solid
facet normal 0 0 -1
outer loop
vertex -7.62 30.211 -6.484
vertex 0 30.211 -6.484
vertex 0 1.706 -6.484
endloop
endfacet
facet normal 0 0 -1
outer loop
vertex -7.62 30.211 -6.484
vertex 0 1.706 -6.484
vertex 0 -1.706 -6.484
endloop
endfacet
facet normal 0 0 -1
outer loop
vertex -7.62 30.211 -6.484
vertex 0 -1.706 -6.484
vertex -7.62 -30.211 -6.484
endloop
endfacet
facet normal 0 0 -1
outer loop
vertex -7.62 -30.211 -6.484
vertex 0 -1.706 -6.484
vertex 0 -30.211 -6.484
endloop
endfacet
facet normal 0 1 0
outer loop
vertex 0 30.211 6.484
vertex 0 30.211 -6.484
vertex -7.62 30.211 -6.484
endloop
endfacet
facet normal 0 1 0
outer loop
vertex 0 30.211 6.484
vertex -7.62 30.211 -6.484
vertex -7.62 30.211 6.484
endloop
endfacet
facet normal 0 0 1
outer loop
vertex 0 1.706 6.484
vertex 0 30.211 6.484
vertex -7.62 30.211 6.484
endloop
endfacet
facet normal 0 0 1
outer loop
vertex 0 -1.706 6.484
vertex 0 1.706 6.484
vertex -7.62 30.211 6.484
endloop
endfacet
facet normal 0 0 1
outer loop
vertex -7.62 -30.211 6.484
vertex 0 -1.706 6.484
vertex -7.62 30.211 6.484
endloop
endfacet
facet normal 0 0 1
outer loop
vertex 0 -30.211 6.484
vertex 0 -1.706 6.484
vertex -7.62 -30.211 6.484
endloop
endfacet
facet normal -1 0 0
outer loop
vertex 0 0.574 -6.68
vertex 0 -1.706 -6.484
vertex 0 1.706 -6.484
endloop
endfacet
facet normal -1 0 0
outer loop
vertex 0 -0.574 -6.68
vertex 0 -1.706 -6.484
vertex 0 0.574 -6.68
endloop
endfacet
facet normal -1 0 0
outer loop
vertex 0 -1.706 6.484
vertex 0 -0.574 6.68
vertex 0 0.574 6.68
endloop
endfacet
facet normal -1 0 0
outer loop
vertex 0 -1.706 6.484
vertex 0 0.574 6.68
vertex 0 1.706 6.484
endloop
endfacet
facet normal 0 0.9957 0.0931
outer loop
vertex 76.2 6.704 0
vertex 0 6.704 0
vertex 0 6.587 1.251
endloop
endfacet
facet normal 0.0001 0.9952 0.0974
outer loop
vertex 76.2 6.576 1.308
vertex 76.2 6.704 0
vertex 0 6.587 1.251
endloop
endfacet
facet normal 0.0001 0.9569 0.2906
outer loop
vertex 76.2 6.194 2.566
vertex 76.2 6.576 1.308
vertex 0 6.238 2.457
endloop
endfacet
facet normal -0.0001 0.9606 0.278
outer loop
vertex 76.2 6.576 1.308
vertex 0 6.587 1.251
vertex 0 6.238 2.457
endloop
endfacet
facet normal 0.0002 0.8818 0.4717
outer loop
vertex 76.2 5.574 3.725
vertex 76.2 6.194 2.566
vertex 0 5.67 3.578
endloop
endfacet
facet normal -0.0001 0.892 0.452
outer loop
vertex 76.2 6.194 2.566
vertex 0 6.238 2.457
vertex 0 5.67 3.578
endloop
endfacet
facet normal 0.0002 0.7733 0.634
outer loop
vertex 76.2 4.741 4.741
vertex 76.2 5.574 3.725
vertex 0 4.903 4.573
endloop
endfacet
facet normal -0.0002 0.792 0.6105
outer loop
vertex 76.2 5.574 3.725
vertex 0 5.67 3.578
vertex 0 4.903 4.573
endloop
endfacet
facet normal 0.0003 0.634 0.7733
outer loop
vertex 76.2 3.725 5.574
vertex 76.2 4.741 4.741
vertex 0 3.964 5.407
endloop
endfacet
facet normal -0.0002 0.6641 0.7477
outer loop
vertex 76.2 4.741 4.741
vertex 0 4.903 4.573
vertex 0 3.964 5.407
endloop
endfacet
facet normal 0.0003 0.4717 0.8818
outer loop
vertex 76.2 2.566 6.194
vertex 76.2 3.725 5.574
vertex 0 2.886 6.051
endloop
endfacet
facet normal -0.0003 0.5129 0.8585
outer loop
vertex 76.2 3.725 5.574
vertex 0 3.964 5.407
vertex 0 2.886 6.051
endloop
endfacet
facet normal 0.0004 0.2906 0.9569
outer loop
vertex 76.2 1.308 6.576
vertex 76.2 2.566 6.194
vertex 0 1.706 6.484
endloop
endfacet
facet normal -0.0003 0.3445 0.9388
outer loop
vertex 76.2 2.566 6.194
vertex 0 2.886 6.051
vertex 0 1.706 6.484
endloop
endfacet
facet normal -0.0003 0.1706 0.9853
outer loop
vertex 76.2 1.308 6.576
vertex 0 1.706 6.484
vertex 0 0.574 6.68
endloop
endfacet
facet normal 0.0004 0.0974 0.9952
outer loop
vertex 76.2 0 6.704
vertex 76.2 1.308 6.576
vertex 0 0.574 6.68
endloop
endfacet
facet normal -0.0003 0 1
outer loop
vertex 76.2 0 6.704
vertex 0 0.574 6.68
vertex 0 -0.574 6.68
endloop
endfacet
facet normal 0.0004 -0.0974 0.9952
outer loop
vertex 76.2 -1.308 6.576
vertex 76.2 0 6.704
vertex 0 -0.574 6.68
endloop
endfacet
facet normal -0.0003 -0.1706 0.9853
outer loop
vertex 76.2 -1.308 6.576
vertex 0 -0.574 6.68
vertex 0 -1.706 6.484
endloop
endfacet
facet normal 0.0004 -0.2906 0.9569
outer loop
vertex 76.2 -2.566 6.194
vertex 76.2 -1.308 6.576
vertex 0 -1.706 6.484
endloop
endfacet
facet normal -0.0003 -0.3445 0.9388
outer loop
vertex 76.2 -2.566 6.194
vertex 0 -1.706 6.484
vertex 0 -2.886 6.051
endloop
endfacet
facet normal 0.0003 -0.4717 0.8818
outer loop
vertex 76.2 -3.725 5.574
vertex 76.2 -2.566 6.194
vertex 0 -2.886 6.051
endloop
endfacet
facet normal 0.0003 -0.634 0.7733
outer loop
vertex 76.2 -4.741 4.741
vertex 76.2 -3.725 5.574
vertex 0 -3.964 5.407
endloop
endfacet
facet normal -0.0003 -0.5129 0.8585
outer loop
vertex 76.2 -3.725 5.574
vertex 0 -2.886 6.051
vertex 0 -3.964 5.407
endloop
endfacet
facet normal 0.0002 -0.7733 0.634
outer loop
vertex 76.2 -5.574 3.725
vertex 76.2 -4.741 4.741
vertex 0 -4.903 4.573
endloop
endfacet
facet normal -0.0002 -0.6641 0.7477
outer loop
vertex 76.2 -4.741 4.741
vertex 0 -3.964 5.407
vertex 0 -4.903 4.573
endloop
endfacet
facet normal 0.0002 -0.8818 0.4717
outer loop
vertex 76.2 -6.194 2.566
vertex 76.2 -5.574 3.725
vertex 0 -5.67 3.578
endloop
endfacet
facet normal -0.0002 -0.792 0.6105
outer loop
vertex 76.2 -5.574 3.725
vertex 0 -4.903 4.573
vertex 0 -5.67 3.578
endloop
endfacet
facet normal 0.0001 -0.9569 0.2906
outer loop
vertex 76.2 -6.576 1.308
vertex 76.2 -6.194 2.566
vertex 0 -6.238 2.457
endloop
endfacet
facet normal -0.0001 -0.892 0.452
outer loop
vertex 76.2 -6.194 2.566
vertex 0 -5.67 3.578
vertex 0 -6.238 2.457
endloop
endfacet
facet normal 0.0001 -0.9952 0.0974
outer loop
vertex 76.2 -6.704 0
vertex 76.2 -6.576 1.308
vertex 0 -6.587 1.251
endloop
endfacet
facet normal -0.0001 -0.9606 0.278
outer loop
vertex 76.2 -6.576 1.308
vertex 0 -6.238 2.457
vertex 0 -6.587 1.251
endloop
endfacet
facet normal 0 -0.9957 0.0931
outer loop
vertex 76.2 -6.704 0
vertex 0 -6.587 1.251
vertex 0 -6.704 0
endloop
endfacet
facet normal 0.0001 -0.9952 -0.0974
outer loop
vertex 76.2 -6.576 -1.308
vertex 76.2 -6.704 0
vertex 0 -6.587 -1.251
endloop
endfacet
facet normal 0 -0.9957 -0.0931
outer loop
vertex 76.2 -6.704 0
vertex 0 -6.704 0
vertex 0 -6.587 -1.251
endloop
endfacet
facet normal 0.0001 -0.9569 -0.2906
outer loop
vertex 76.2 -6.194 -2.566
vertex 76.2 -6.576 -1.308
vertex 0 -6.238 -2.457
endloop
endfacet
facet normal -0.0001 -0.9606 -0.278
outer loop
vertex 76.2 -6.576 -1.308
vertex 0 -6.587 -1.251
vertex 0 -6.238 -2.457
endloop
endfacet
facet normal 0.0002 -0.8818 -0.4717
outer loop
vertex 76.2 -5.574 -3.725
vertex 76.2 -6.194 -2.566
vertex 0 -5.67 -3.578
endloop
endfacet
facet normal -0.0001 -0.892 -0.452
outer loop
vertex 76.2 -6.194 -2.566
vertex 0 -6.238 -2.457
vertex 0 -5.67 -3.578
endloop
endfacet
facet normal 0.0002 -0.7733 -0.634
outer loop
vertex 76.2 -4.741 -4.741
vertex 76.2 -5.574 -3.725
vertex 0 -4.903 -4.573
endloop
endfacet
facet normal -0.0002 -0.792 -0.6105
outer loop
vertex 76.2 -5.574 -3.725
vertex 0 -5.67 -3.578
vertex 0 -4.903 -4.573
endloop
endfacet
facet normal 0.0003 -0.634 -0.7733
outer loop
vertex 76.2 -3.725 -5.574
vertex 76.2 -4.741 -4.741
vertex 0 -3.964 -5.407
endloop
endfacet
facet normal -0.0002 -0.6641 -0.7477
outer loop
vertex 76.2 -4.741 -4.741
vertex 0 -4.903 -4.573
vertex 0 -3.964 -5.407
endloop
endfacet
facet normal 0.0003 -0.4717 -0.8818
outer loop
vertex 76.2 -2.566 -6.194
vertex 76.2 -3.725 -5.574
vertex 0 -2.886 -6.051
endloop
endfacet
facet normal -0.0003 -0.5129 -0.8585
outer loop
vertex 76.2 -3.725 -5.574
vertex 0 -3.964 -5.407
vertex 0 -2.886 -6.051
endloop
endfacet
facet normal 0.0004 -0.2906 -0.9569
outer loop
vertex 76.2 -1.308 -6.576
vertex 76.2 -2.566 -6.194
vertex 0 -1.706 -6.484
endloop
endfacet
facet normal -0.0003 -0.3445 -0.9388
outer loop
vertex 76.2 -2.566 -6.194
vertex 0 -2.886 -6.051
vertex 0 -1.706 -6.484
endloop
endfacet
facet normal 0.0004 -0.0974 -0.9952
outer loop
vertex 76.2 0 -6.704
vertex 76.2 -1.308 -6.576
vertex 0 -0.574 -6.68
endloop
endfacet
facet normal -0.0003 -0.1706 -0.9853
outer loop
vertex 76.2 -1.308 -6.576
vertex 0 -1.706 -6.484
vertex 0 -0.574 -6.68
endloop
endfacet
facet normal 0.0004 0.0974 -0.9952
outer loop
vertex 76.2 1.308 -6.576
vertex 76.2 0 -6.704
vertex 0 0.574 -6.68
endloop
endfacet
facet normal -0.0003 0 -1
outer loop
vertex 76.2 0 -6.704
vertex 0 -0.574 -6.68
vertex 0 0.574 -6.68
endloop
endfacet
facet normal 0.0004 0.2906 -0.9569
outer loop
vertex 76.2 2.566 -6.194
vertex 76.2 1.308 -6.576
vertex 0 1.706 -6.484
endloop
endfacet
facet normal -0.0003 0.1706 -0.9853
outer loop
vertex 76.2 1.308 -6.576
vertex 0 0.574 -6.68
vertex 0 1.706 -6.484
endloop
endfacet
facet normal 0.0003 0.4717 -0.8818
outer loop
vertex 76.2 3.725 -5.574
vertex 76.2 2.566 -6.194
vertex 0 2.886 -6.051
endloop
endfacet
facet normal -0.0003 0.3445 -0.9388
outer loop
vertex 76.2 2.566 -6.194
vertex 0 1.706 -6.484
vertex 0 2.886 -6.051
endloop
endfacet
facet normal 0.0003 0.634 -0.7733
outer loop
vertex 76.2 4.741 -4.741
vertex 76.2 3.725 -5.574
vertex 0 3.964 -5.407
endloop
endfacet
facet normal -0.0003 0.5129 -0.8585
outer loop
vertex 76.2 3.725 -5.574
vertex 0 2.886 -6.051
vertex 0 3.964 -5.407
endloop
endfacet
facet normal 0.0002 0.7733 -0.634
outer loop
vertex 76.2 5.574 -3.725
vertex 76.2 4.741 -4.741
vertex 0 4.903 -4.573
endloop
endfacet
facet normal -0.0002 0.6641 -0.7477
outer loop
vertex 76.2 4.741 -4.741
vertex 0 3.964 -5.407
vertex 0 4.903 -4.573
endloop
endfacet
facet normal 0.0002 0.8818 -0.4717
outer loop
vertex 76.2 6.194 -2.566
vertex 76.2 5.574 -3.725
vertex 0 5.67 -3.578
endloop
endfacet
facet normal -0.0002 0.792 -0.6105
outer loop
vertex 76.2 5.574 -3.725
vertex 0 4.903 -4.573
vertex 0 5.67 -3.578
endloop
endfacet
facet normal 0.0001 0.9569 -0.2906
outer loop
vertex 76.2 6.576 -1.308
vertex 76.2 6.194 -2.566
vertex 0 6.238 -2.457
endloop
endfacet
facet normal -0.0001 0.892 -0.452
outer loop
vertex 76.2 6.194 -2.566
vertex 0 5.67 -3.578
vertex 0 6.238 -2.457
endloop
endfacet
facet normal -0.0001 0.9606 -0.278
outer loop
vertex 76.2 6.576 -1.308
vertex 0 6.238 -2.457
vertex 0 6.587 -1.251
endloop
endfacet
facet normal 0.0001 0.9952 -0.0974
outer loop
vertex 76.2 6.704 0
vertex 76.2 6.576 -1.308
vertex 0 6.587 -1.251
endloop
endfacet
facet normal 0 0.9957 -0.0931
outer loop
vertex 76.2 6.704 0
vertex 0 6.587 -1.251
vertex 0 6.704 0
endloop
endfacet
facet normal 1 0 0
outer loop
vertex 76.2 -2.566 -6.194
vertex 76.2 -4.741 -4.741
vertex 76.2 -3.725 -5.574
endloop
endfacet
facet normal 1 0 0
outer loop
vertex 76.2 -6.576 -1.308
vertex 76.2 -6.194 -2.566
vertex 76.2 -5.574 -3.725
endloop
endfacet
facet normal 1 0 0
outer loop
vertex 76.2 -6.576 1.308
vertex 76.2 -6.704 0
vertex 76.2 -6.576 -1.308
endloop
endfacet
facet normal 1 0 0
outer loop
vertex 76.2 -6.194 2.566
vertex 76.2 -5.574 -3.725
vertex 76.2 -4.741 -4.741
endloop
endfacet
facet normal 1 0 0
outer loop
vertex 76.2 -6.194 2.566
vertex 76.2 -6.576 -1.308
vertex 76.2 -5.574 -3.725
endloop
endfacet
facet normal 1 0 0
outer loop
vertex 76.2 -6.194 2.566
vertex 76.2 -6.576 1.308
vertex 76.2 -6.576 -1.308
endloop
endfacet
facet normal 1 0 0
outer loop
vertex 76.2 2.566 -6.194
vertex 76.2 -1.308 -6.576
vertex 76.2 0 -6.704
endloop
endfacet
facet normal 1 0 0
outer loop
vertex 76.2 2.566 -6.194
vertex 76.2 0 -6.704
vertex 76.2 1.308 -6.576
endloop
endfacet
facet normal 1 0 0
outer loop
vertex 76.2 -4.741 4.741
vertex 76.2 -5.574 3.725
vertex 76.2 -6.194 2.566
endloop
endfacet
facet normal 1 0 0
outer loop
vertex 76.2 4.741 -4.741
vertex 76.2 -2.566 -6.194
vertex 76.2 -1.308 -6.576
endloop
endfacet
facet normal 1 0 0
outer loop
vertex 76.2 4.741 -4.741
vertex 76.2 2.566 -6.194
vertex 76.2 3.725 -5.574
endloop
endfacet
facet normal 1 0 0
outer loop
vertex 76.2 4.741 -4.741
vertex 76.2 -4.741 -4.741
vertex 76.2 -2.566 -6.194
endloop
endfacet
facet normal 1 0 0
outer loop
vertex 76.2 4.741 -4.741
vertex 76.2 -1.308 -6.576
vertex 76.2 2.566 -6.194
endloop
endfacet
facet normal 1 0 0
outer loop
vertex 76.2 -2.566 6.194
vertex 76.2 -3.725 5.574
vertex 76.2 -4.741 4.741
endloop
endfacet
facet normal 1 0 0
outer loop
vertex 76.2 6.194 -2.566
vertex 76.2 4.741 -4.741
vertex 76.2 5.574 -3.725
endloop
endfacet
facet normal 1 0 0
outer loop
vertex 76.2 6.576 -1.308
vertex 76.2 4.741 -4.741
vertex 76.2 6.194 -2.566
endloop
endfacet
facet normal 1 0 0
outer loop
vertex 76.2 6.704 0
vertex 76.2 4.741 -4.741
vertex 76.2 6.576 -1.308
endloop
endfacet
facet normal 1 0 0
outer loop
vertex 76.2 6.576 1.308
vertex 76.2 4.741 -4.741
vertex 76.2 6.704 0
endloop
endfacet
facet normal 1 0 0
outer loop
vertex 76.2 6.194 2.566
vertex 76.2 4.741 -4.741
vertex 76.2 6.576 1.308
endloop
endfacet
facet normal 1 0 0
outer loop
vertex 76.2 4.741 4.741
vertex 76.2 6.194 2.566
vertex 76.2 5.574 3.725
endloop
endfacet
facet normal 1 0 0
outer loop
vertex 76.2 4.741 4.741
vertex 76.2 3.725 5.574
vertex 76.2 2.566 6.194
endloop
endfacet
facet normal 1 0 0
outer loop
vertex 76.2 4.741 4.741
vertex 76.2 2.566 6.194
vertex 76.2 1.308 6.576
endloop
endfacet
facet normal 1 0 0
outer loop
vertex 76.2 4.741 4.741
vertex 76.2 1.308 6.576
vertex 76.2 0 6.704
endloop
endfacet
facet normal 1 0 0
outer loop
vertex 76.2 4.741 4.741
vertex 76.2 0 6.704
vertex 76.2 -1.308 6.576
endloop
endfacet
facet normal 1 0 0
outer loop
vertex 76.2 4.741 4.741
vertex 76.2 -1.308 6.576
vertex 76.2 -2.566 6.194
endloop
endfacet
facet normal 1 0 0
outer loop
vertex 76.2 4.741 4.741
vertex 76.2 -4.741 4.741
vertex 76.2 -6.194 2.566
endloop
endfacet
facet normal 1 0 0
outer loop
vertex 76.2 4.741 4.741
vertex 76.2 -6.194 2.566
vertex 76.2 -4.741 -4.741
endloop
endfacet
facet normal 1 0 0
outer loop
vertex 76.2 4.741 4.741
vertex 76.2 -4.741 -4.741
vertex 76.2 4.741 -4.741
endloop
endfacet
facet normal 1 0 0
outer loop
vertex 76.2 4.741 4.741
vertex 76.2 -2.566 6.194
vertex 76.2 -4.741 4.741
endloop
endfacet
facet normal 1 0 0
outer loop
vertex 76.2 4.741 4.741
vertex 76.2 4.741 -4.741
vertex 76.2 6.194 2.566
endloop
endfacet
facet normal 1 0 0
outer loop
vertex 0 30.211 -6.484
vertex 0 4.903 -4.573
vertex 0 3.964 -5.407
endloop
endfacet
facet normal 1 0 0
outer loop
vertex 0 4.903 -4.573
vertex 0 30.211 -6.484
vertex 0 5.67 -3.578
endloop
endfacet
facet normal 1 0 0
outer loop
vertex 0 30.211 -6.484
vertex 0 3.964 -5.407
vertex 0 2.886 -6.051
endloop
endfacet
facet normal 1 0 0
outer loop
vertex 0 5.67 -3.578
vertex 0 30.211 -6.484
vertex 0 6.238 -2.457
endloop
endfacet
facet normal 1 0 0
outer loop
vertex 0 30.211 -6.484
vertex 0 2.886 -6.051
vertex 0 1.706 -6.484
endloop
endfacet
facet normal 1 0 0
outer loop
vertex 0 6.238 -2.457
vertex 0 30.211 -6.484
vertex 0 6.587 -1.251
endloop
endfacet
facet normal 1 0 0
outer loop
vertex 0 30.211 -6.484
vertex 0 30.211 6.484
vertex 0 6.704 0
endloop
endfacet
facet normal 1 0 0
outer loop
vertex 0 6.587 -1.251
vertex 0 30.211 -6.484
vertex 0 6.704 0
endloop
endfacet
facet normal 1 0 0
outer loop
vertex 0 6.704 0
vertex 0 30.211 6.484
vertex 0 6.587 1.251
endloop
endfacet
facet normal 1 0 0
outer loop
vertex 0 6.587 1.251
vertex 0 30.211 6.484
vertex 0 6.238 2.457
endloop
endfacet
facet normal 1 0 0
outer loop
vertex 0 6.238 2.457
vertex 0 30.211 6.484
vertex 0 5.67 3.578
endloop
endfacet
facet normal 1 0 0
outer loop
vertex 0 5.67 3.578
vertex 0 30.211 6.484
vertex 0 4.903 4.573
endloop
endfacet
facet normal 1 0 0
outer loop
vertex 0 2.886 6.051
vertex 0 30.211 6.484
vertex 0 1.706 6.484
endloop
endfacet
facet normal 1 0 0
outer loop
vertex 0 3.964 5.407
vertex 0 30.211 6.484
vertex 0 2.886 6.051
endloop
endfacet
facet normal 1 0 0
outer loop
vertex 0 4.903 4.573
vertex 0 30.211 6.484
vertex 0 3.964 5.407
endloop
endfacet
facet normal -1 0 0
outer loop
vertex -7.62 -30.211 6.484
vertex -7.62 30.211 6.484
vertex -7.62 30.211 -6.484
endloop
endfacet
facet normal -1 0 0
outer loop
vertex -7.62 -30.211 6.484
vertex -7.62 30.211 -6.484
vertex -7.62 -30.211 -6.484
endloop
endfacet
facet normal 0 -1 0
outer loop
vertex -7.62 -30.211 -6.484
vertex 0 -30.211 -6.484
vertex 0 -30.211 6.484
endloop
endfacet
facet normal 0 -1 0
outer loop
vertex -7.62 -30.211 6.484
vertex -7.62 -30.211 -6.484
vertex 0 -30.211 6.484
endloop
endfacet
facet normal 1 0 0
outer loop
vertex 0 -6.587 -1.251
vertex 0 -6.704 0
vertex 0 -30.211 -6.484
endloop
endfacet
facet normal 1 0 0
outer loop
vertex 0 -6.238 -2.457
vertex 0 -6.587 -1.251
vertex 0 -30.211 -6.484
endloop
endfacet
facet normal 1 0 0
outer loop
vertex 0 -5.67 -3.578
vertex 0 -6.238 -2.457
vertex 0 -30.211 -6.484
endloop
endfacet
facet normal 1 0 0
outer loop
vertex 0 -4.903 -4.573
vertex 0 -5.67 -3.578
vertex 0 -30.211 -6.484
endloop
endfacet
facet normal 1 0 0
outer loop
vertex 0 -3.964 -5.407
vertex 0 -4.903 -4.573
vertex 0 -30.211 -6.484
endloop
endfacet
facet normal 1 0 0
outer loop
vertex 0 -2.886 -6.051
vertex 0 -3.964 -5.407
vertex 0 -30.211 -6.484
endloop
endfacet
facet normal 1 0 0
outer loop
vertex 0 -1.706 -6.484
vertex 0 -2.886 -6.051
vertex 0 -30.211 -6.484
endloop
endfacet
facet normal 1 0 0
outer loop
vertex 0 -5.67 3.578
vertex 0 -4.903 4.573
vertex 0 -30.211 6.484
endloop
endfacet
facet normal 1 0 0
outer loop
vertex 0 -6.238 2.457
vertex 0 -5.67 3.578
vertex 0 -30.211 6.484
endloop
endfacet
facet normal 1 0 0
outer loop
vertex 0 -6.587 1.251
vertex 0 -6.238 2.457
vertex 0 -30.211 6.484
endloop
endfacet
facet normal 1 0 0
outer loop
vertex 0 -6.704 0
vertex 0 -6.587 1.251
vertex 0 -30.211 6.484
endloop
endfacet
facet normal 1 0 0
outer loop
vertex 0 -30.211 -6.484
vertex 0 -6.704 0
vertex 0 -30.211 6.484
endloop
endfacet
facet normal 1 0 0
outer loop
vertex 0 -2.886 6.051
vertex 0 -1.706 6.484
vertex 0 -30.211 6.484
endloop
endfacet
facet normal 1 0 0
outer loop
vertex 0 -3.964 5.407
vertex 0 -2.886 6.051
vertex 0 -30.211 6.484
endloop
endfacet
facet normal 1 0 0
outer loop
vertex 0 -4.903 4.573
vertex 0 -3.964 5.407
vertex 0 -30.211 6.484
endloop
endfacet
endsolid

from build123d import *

# Parameters (mm, degrees)
F0_R     = 6.704343
F1_DEPTH = 76.2
F2_W     = 60.421344
F2_H     = 12.967138
F3_DEPTH = 7.62


with BuildPart() as f1:
    # F0 (on Right) → F1 (new body)
    with BuildSketch(Plane.YZ):
        Circle(F0_R)
    extrude(amount=F1_DEPTH)

    # F2 (on face) → F3 (join)
    with BuildSketch(Plane(origin=(0, 0, 0), x_dir=(0, -1, 0), z_dir=(-1, 0, 0))):
        Rectangle(F2_W, F2_H)
    extrude(amount=F3_DEPTH)


solid = f1.part
